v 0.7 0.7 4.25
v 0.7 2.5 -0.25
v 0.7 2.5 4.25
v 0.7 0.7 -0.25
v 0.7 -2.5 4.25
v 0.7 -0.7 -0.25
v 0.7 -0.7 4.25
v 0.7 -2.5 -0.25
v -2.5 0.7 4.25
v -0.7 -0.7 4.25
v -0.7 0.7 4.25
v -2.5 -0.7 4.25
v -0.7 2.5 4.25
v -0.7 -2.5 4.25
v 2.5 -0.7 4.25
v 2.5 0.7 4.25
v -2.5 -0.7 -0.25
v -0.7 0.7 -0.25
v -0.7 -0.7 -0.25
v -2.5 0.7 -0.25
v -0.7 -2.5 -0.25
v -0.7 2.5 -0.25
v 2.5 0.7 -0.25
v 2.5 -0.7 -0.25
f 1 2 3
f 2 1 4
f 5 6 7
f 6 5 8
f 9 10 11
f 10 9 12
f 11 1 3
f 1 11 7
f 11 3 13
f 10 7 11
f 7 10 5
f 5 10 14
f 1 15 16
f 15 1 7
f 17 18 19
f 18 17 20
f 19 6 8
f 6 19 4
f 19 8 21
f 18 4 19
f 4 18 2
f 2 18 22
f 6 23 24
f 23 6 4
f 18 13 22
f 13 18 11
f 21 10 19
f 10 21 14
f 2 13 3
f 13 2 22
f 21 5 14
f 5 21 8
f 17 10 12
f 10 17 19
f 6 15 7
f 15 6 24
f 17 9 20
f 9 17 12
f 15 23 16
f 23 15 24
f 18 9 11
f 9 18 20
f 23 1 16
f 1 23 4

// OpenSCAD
translate ([0, 0, 2.0]) {
  union () {
    cube ([1.4, 5.0, 4.5], center=true);
    rotate (a=90.0, v=[0, 0, 1]) {
      cube ([1.4, 5.0, 4.5], center=true);
    }
  }
}
